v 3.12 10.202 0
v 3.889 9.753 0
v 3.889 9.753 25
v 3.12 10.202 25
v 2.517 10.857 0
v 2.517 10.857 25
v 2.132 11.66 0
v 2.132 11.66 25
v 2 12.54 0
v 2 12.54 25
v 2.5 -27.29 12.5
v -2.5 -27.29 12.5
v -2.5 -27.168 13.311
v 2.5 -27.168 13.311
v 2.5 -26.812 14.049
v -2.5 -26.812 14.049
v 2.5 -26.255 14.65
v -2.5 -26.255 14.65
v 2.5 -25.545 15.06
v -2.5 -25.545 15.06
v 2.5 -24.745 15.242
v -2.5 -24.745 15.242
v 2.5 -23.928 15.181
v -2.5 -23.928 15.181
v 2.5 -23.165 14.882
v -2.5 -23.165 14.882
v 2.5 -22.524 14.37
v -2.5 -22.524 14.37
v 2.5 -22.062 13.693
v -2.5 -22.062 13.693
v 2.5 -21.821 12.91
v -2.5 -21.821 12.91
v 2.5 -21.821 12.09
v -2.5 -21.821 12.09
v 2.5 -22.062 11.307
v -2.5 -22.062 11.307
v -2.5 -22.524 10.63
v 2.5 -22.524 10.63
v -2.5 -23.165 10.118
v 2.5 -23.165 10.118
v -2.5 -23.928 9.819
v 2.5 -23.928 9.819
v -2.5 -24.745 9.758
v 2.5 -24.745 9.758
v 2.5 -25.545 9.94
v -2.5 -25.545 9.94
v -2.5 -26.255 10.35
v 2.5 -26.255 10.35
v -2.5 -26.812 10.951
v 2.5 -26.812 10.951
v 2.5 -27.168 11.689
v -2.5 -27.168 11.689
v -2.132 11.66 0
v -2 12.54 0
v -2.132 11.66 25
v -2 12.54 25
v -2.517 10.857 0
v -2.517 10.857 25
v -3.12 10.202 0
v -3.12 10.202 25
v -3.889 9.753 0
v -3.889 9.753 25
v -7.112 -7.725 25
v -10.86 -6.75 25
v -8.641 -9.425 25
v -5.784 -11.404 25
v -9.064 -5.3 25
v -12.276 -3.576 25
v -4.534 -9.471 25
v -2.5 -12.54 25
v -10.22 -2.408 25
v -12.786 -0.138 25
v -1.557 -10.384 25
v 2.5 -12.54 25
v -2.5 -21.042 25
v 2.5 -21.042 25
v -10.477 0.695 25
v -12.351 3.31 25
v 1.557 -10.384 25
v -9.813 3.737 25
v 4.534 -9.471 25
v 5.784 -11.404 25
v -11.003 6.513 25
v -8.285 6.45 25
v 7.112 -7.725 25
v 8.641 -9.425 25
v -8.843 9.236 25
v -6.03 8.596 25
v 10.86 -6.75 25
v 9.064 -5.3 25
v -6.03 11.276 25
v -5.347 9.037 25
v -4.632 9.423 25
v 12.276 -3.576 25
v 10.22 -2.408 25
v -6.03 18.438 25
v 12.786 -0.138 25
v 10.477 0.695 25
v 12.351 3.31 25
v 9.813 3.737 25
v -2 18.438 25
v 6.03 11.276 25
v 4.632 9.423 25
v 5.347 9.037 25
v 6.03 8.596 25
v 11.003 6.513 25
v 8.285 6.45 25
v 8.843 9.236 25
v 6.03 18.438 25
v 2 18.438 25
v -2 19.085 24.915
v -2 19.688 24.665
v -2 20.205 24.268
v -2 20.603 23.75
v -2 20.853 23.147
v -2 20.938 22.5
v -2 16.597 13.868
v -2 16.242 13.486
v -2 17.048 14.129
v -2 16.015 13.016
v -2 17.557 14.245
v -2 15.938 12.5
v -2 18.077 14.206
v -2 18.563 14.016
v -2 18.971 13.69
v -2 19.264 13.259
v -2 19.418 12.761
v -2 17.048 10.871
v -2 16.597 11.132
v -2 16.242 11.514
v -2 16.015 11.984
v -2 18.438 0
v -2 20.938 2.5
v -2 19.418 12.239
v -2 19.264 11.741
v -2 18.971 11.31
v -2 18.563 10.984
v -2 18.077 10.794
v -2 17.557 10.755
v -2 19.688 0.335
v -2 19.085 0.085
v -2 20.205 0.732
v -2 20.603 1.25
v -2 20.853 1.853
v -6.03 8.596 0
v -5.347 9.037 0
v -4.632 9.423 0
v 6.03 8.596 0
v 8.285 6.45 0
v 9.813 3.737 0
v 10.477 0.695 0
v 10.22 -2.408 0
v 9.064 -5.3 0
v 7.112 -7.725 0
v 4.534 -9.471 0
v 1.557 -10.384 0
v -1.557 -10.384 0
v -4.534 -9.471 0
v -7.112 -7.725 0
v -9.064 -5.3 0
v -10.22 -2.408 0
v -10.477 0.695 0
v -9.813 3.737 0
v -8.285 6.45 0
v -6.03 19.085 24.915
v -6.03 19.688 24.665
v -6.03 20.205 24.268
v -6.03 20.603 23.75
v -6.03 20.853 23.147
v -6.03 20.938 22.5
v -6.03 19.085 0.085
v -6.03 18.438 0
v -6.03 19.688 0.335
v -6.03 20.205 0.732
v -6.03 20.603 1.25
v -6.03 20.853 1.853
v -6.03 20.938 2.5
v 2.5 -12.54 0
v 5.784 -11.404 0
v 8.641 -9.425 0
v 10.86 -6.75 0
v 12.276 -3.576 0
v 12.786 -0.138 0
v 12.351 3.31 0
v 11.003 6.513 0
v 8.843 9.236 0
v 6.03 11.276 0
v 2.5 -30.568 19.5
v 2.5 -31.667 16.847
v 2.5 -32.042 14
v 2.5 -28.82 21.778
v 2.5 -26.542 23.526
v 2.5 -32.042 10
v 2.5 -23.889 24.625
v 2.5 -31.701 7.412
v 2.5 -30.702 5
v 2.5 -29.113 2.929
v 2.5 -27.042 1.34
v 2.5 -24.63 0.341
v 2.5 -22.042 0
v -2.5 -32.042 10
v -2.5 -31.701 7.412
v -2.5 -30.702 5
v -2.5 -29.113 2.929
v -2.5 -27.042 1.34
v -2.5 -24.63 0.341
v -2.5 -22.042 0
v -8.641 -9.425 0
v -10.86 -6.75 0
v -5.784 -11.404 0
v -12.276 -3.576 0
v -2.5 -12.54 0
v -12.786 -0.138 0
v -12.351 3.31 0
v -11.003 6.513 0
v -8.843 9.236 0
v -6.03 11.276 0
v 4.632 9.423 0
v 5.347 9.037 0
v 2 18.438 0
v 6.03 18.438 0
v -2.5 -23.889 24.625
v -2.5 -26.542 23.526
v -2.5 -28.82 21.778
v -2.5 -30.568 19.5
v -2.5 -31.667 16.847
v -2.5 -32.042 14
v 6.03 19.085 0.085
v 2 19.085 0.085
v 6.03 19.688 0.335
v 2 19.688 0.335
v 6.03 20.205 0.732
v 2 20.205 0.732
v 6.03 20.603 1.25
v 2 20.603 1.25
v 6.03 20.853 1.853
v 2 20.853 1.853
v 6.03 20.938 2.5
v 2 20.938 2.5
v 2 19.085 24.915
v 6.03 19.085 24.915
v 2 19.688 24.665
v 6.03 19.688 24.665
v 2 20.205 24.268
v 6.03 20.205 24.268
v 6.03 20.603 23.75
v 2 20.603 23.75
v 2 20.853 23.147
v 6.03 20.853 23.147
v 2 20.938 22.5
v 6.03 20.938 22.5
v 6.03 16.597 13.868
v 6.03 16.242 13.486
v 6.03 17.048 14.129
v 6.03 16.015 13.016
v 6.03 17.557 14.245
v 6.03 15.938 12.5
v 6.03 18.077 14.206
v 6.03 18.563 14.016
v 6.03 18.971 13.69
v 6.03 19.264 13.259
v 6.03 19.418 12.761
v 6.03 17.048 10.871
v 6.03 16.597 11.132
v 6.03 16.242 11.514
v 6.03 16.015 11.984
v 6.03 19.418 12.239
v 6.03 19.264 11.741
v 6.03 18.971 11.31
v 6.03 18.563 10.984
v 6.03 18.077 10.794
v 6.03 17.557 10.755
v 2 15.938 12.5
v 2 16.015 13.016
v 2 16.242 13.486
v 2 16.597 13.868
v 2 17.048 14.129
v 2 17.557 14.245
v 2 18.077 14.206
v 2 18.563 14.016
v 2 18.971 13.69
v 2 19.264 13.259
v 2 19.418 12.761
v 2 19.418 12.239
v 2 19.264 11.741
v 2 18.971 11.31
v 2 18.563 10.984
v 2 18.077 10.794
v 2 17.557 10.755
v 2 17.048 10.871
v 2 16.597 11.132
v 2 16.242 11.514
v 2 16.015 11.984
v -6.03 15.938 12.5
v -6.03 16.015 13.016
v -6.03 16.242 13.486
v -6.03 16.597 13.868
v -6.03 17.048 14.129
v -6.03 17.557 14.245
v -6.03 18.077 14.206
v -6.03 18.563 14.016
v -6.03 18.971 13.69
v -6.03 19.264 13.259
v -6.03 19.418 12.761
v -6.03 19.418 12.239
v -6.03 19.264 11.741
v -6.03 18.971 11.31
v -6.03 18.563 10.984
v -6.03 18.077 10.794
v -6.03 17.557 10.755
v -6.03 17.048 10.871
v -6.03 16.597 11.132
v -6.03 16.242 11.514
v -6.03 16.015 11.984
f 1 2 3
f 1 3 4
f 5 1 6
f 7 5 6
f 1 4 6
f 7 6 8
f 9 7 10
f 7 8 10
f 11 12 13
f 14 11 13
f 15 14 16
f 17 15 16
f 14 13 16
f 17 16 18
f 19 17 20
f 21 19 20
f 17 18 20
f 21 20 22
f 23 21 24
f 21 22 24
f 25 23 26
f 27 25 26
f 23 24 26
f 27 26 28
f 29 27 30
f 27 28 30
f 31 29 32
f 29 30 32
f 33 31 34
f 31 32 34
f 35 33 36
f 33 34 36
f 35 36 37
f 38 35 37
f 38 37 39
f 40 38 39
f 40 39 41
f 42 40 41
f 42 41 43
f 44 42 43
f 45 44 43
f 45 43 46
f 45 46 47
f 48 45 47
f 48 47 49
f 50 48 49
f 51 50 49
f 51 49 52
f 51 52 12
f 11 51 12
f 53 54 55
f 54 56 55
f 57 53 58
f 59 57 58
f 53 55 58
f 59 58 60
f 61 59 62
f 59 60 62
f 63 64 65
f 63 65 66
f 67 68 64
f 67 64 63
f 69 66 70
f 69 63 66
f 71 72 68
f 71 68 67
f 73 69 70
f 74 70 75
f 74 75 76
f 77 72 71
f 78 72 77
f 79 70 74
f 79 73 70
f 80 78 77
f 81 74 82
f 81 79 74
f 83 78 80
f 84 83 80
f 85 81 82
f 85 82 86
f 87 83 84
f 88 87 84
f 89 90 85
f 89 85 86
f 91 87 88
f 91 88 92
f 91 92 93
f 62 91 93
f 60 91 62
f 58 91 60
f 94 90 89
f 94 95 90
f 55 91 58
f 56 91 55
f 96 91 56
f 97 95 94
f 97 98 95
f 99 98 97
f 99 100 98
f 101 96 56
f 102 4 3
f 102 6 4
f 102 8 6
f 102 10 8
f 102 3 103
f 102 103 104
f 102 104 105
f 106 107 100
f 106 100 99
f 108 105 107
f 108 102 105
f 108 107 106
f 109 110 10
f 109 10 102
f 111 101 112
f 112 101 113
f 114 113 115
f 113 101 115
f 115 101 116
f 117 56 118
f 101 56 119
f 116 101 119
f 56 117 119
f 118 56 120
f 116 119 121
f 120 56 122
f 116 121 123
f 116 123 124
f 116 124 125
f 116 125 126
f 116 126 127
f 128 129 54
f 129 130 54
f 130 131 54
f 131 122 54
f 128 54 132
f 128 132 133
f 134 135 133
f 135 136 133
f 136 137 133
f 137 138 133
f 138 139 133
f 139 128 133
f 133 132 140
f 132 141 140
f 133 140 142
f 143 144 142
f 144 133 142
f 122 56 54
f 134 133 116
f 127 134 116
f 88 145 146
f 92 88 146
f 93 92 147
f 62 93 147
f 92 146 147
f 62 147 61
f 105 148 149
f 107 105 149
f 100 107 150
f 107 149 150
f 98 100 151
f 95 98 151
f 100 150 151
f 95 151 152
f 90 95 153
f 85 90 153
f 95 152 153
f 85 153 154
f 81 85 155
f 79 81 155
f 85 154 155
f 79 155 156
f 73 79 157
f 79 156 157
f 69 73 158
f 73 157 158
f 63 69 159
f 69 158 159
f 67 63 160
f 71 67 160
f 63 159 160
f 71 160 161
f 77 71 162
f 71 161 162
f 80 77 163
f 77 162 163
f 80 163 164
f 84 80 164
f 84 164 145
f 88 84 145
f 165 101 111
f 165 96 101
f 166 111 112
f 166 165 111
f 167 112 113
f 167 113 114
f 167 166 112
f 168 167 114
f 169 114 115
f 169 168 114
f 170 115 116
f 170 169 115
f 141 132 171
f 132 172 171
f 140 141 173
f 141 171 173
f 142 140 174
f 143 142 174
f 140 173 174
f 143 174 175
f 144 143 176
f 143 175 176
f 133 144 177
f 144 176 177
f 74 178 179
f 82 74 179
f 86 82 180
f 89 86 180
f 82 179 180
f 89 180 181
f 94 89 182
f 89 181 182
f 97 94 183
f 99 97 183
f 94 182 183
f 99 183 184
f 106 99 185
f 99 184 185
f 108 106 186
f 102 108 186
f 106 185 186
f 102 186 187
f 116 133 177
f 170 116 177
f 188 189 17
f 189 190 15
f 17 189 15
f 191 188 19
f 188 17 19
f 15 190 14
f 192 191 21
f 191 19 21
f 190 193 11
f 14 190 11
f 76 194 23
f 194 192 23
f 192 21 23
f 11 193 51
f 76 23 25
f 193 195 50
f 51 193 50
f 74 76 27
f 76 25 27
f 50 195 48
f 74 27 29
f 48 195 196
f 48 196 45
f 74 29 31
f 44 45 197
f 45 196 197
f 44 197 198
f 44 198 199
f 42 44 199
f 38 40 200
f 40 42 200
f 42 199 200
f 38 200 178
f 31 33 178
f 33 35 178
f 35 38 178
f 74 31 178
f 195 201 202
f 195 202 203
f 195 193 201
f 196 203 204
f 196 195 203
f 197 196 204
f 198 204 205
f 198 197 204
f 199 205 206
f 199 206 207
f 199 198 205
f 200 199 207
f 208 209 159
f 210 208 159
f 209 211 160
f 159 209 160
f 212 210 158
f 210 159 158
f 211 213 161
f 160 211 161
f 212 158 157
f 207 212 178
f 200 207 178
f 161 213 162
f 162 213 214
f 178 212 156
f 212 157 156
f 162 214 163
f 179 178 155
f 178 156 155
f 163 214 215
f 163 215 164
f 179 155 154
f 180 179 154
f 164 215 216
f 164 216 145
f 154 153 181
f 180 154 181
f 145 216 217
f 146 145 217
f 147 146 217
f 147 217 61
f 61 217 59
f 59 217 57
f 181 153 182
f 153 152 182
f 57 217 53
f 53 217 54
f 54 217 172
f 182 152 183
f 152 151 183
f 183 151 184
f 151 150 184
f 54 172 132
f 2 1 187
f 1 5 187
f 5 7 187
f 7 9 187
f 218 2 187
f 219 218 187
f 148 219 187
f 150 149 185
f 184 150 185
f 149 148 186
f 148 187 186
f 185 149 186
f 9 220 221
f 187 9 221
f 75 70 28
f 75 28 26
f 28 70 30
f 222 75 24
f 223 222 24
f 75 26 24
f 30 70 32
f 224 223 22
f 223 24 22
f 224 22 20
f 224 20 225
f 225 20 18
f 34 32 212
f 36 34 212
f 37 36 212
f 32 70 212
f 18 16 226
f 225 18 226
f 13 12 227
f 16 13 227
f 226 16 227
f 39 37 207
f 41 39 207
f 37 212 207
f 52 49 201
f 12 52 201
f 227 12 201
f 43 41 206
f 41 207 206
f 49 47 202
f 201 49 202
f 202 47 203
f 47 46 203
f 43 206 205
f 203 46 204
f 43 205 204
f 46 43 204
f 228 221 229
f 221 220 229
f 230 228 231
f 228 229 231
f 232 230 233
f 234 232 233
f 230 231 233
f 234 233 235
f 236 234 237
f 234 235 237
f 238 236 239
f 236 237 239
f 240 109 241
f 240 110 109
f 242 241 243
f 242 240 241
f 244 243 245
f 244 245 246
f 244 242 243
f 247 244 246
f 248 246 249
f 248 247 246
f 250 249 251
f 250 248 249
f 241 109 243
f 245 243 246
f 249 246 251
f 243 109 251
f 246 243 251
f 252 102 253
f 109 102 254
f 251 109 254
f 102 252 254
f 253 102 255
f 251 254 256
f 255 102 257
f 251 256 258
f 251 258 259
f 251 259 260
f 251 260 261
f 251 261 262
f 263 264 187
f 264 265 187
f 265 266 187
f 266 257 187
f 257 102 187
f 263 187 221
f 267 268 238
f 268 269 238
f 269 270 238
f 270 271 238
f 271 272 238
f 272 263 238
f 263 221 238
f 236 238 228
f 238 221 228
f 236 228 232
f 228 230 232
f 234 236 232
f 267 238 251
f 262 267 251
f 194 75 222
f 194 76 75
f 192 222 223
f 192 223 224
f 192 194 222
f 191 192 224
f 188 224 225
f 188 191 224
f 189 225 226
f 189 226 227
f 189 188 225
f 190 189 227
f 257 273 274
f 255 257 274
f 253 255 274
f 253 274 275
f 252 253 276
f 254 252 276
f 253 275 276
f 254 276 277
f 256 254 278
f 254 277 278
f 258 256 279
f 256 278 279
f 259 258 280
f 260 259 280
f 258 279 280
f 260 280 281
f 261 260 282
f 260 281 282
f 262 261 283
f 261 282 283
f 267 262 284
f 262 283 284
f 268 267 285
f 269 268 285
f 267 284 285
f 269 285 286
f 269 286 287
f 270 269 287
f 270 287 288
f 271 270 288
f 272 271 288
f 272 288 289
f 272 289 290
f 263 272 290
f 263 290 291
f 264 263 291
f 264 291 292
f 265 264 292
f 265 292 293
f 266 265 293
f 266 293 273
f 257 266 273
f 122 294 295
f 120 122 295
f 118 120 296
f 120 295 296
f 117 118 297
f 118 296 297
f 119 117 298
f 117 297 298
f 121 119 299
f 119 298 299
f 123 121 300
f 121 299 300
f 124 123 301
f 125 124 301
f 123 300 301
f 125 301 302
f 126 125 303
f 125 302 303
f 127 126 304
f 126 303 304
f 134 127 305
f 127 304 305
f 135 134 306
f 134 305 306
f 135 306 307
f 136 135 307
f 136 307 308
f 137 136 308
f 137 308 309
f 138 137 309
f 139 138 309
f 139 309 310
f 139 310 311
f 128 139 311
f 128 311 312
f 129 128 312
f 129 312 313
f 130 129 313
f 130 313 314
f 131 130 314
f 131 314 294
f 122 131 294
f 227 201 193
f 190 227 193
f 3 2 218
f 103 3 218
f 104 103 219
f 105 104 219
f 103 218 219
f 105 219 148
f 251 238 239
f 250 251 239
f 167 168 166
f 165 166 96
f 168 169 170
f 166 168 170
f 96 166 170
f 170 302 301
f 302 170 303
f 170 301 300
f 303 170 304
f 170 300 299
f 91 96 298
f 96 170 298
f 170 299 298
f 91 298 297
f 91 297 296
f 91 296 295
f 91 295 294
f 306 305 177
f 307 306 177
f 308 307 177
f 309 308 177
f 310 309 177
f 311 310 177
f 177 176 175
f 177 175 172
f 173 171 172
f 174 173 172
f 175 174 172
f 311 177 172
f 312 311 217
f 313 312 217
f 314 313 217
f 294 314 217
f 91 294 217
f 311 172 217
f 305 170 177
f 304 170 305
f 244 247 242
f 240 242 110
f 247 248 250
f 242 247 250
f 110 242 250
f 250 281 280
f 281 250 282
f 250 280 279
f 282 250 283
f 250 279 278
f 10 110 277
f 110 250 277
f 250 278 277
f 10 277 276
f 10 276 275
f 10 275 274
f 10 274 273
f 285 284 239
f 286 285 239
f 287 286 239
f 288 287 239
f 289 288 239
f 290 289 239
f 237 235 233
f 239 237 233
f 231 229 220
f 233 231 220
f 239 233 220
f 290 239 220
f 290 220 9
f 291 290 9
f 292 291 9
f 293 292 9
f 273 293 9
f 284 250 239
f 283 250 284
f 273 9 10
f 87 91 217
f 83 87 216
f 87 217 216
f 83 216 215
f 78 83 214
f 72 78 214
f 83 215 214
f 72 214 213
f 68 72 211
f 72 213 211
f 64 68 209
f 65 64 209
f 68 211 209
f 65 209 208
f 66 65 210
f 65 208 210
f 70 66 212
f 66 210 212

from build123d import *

# Parameters (mm, degrees)
F1_DEPTH = 25
F2_R     = 2.75
F2_R_2   = 1.75
F3_DEPTH = 50
F4_R     = 11
F5_R     = 10
F6_R     = 2.5
F7_R     = 3


with BuildPart() as f1:
    # F0 (on Top) → F1 (new body)
    with BuildSketch(Plane.XY):
        with BuildLine():
            ThreePointArc((2.5, -12.539936204), (0, -12.7867118525), (-2.5, -12.539936204))
            Line((-2.5, -12.539936204), (-2.5, -32.0420756284))
            Line((-2.5, -32.0420756284), (0, -32.0420756284))
            Line((0, -32.0420756284), (2.5, -32.0420756284))
            Line((2.5, -32.0420756284), (2.5, -12.539936204))
        make_face()
        with BuildLine():
            ThreePointArc((-6.0296314677, 11.2757946223), (-4.0714568053, 12.1211896892), (-2, 12.6293309403))
            Line((-2, 12.6293309403), (-2, 20.9377203137))
            Line((-2, 20.9377203137), (-6.0296314677, 20.9377203137))
            Line((-6.0296314677, 20.9377203137), (-6.0296314677, 11.2757946223))
        make_face()
        with BuildLine():
            ThreePointArc((-6.0296314677, 8.5961354319), (-4.1050168721, 9.6643073461), (-2, 10.307764064))
            Line((-2, 10.307764064), (-2, 12.6293309403))
            ThreePointArc((-2, 12.6293309403), (-4.0714568053, 12.1211896892), (-6.0296314677, 11.2757946223))
            Line((-6.0296314677, 11.2757946223), (-6.0296314677, 8.5961354319))
        make_face()
        with BuildLine():
            ThreePointArc((2, 10.307764064), (4.1050168721, 9.6643073461), (6.0296314677, 8.5961354319))
            Line((6.0296314677, 8.5961354319), (6.0296314677, 11.2757946223))
            ThreePointArc((6.0296314677, 11.2757946223), (4.0714568053, 12.1211896892), (2, 12.6293309403))
            Line((2, 12.6293309403), (2, 10.307764064))
        make_face()
        with BuildLine():
            ThreePointArc((2, 12.6293309403), (4.0714568053, 12.1211896892), (6.0296314677, 11.2757946223))
            Line((6.0296314677, 11.2757946223), (6.0296314677, 20.9377203137))
            Line((6.0296314677, 20.9377203137), (2, 20.9377203137))
            Line((2, 20.9377203137), (2, 13.3510299228))
            Line((2, 13.3510299228), (2, 12.6293309403))
        make_face()
        with BuildLine():
            ThreePointArc((6.0296314677, 8.5961354319), (0, -10.5), (-6.0296314677, 8.5961354319))
            Line((-6.0296314677, 8.5961354319), (-6.0296314677, 11.2757946223))
            ThreePointArc((-6.0296314677, 11.2757946223), (-12.648553749, -1.8745901043), (-2.5, -12.539936204))
            ThreePointArc((-2.5, -12.539936204), (0, -12.7867118525), (2.5, -12.539936204))
            ThreePointArc((2.5, -12.539936204), (12.648553749, -1.8745901043), (6.0296314677, 11.2757946223))
            Line((6.0296314677, 11.2757946223), (6.0296314677, 8.5961354319))
        make_face()
    extrude(amount=F1_DEPTH)

    # F2 (on face) → F3 (cut)
    with BuildSketch(Plane(origin=(-6.0296314677, 0, 0), x_dir=(0, -1, 0), z_dir=(-1, 0, 0))):
        with Locations((24.539936204, 12.5)):
            Circle(F2_R)
        with Locations((-17.6877203137, 12.5)):
            Circle(F2_R_2)
    extrude(amount=-F3_DEPTH, mode=Mode.SUBTRACT)

    # F4
    f4_edges = [f1.edges().sort_by_distance(p)[0] for p in [
        (0, -32.042076, 25),
    ]]
    fillet(f4_edges, radius=F4_R)

    # F5
    f5_edges = [f1.edges().sort_by_distance(p)[0] for p in [
        (0, -32.042076, 0),
    ]]
    fillet(f5_edges, radius=F5_R)

    # F6
    f6_edges = [f1.edges().sort_by_distance(p)[0] for p in [
        (-4.014816, 20.93772, 25),
        (4.014816, 20.93772, 25),
        (4.014816, 20.93772, 0),
        (-4.014816, 20.93772, 0),
    ]]
    fillet(f6_edges, radius=F6_R)

    # F7
    f7_edges = [f1.edges().sort_by_distance(p)[0] for p in [
        (-2, 10.307764, 12.5),
        (2, 10.307764, 12.5),
    ]]
    fillet(f7_edges, radius=F7_R)


solid = f1.part
